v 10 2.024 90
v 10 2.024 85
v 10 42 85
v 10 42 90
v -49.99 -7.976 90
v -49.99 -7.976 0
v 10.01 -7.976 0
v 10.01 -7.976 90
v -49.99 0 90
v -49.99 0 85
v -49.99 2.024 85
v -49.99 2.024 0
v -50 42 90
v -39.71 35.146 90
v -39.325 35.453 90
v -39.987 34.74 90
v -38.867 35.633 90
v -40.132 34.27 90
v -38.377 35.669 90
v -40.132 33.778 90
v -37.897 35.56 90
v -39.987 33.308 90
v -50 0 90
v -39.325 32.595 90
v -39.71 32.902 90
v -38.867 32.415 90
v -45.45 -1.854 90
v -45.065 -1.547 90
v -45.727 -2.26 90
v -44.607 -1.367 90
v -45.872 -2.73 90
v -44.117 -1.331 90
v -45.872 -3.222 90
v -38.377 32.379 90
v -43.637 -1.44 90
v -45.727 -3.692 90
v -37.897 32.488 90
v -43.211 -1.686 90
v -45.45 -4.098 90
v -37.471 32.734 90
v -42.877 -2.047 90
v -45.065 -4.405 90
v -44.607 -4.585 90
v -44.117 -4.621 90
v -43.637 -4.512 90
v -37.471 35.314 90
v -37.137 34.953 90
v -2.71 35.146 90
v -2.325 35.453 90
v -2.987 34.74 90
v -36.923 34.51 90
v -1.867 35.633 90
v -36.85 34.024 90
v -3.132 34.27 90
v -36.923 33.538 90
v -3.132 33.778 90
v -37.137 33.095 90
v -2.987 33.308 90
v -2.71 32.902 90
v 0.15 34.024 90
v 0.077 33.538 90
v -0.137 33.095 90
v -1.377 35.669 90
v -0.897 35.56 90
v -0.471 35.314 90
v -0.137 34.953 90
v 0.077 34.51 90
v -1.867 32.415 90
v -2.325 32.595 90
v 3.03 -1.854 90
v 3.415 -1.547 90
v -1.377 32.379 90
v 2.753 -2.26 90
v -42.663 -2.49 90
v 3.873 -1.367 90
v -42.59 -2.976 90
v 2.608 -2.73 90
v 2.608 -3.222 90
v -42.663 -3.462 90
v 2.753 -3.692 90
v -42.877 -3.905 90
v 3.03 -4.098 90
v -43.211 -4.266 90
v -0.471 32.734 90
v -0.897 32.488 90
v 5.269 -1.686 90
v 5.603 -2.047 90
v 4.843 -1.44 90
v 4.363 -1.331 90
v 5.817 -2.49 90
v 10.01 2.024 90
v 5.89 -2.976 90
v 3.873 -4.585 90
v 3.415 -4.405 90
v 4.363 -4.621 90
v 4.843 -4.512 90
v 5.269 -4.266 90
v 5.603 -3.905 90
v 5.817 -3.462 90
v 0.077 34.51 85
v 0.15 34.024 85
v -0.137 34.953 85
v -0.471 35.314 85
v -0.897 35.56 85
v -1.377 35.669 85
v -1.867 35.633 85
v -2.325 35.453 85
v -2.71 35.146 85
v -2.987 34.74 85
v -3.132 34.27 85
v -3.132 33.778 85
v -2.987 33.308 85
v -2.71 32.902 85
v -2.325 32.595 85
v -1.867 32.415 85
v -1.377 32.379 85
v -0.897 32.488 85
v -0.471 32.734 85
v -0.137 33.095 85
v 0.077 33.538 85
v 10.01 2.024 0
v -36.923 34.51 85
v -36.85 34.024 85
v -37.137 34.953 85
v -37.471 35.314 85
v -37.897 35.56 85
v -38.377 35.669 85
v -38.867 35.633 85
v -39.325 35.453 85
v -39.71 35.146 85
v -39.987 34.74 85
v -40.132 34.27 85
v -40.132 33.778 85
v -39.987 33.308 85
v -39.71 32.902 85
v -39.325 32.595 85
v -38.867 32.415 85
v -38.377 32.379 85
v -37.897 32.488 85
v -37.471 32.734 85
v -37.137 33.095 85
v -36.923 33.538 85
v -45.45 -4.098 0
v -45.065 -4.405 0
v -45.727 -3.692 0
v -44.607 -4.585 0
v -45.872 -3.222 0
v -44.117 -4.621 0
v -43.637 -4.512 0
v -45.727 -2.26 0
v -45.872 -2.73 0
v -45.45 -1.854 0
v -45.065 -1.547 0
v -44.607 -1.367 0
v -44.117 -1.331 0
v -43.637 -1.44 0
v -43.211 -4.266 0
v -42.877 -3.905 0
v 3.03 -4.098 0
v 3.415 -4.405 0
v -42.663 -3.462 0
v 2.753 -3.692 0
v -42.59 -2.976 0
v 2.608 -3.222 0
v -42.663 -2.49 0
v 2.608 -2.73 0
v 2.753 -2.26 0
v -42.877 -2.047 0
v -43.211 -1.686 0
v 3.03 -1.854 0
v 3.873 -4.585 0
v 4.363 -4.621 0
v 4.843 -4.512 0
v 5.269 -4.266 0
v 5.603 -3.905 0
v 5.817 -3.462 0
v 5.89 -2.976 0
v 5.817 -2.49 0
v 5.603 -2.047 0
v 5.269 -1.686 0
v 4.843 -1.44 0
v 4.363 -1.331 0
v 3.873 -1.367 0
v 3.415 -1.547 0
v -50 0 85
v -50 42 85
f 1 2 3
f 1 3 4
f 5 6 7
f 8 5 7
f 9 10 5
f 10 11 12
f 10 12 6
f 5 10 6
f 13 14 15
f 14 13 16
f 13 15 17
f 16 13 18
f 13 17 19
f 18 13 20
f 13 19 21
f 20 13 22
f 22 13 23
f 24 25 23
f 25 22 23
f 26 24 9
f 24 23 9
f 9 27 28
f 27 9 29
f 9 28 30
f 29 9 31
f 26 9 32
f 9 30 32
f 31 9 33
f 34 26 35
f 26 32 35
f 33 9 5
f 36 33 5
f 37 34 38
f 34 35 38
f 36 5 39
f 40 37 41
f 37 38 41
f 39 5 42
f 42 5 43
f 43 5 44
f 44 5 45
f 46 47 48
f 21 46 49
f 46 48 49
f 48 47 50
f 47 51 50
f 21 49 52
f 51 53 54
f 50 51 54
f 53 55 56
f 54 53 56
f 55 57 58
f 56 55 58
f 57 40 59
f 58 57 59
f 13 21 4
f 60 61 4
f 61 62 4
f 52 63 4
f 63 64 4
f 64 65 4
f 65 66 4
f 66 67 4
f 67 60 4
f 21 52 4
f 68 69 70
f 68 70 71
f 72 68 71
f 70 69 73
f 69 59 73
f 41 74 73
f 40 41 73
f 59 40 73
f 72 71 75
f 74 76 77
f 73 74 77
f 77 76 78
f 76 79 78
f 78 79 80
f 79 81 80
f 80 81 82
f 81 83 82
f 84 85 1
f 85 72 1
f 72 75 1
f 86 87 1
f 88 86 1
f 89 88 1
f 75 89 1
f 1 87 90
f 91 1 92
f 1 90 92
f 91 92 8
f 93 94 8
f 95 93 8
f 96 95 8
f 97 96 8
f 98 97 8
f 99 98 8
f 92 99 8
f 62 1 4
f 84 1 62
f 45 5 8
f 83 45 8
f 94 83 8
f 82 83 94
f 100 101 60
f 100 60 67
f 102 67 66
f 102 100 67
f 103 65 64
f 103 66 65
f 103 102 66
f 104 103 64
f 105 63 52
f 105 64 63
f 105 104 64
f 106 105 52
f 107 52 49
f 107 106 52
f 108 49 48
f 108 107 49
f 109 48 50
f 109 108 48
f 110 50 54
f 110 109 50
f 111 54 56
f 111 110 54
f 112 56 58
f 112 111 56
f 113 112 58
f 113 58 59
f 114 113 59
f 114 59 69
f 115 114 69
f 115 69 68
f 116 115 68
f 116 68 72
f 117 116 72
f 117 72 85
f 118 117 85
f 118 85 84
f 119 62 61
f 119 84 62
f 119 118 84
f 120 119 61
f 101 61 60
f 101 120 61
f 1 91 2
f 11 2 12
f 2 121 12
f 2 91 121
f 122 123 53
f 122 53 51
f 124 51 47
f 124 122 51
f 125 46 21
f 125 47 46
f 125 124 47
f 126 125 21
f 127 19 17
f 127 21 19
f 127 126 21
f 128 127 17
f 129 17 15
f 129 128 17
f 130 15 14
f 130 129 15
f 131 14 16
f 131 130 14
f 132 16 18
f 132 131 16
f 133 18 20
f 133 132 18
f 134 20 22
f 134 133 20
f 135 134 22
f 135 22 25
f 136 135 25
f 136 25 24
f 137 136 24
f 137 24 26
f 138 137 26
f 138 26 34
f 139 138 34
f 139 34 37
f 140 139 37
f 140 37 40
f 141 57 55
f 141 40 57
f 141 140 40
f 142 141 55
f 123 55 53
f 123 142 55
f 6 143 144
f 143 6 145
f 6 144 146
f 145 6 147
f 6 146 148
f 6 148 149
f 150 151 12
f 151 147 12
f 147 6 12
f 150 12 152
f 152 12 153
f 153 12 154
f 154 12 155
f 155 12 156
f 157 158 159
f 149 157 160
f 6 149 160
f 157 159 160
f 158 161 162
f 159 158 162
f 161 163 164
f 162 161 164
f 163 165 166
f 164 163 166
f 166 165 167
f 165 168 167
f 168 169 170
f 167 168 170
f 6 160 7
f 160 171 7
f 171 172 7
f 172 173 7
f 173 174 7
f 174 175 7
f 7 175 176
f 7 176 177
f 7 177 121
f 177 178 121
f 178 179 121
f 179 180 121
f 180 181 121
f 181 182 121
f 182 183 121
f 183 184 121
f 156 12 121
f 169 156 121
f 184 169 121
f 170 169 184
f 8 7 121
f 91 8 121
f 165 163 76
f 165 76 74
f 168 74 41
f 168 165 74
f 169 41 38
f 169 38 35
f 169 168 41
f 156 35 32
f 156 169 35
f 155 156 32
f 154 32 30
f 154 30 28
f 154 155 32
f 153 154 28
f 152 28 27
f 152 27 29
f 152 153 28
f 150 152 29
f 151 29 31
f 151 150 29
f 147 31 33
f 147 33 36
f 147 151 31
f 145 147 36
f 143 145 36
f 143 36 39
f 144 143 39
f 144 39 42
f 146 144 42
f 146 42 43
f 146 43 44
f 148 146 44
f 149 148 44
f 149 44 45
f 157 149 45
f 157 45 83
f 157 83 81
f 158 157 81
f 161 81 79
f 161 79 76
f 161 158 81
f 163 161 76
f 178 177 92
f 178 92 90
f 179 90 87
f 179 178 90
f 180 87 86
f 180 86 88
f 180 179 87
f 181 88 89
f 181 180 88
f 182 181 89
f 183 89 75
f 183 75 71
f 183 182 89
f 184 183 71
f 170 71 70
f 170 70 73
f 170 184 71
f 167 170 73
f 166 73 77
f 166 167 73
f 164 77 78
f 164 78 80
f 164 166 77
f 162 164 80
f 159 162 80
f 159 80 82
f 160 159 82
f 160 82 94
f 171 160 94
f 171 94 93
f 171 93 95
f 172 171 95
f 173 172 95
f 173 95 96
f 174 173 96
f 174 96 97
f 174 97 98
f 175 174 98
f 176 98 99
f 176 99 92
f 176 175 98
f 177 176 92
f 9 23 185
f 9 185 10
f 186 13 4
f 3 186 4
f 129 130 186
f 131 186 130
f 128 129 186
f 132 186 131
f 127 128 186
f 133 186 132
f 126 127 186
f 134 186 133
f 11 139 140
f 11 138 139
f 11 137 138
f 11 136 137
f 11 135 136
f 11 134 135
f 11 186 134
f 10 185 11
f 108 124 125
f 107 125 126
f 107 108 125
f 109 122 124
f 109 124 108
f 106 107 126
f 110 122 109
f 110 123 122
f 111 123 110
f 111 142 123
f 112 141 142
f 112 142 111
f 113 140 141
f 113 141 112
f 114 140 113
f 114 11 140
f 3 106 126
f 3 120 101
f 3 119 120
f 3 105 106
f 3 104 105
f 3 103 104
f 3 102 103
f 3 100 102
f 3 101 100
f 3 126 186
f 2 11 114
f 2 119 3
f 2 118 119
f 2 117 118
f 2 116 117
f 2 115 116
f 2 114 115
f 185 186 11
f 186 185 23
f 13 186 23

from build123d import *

# Parameters (mm, degrees)
F0_R     = 1.65
F2_DEPTH = 90
F1_W     = 60
F1_H     = 5
F3_DEPTH = 42
F4_DEPTH = 97


with BuildPart() as f2:
    # F0 (on Top) → F2 (new body)
    with BuildSketch(Plane.XY):
        Polygon((-49.989993, -7.976015), (10.010007, -7.976015), (10.010007, 2.023985), (-49.989994, 2.023985), align=None)
        with Locations((-44.239994, -2.976015)):
            Circle(F0_R, mode=Mode.SUBTRACT)
        with Locations((4.240008, -2.976015)):
            Circle(F0_R, mode=Mode.SUBTRACT)
    extrude(amount=F2_DEPTH)

    # F1 (on Front) → F3 (join)
    with BuildSketch(Plane.XZ):
        with Locations((-20.000001, 87.5)):
            Rectangle(F1_W, F1_H)
    extrude(amount=-F3_DEPTH)

    # F0 (on Top) → F4 (cut)
    with BuildSketch(Plane.XY):
        with Locations((4.240008, -2.976015)):
            Circle(F0_R)
        with Locations((-44.239994, -2.976015)):
            Circle(F0_R)
        with Locations((-38.499993, 34.023985)):
            Circle(F0_R)
        with Locations((-1.499993, 34.023985)):
            Circle(F0_R)
    extrude(amount=F4_DEPTH, mode=Mode.SUBTRACT)


solid = f2.part
